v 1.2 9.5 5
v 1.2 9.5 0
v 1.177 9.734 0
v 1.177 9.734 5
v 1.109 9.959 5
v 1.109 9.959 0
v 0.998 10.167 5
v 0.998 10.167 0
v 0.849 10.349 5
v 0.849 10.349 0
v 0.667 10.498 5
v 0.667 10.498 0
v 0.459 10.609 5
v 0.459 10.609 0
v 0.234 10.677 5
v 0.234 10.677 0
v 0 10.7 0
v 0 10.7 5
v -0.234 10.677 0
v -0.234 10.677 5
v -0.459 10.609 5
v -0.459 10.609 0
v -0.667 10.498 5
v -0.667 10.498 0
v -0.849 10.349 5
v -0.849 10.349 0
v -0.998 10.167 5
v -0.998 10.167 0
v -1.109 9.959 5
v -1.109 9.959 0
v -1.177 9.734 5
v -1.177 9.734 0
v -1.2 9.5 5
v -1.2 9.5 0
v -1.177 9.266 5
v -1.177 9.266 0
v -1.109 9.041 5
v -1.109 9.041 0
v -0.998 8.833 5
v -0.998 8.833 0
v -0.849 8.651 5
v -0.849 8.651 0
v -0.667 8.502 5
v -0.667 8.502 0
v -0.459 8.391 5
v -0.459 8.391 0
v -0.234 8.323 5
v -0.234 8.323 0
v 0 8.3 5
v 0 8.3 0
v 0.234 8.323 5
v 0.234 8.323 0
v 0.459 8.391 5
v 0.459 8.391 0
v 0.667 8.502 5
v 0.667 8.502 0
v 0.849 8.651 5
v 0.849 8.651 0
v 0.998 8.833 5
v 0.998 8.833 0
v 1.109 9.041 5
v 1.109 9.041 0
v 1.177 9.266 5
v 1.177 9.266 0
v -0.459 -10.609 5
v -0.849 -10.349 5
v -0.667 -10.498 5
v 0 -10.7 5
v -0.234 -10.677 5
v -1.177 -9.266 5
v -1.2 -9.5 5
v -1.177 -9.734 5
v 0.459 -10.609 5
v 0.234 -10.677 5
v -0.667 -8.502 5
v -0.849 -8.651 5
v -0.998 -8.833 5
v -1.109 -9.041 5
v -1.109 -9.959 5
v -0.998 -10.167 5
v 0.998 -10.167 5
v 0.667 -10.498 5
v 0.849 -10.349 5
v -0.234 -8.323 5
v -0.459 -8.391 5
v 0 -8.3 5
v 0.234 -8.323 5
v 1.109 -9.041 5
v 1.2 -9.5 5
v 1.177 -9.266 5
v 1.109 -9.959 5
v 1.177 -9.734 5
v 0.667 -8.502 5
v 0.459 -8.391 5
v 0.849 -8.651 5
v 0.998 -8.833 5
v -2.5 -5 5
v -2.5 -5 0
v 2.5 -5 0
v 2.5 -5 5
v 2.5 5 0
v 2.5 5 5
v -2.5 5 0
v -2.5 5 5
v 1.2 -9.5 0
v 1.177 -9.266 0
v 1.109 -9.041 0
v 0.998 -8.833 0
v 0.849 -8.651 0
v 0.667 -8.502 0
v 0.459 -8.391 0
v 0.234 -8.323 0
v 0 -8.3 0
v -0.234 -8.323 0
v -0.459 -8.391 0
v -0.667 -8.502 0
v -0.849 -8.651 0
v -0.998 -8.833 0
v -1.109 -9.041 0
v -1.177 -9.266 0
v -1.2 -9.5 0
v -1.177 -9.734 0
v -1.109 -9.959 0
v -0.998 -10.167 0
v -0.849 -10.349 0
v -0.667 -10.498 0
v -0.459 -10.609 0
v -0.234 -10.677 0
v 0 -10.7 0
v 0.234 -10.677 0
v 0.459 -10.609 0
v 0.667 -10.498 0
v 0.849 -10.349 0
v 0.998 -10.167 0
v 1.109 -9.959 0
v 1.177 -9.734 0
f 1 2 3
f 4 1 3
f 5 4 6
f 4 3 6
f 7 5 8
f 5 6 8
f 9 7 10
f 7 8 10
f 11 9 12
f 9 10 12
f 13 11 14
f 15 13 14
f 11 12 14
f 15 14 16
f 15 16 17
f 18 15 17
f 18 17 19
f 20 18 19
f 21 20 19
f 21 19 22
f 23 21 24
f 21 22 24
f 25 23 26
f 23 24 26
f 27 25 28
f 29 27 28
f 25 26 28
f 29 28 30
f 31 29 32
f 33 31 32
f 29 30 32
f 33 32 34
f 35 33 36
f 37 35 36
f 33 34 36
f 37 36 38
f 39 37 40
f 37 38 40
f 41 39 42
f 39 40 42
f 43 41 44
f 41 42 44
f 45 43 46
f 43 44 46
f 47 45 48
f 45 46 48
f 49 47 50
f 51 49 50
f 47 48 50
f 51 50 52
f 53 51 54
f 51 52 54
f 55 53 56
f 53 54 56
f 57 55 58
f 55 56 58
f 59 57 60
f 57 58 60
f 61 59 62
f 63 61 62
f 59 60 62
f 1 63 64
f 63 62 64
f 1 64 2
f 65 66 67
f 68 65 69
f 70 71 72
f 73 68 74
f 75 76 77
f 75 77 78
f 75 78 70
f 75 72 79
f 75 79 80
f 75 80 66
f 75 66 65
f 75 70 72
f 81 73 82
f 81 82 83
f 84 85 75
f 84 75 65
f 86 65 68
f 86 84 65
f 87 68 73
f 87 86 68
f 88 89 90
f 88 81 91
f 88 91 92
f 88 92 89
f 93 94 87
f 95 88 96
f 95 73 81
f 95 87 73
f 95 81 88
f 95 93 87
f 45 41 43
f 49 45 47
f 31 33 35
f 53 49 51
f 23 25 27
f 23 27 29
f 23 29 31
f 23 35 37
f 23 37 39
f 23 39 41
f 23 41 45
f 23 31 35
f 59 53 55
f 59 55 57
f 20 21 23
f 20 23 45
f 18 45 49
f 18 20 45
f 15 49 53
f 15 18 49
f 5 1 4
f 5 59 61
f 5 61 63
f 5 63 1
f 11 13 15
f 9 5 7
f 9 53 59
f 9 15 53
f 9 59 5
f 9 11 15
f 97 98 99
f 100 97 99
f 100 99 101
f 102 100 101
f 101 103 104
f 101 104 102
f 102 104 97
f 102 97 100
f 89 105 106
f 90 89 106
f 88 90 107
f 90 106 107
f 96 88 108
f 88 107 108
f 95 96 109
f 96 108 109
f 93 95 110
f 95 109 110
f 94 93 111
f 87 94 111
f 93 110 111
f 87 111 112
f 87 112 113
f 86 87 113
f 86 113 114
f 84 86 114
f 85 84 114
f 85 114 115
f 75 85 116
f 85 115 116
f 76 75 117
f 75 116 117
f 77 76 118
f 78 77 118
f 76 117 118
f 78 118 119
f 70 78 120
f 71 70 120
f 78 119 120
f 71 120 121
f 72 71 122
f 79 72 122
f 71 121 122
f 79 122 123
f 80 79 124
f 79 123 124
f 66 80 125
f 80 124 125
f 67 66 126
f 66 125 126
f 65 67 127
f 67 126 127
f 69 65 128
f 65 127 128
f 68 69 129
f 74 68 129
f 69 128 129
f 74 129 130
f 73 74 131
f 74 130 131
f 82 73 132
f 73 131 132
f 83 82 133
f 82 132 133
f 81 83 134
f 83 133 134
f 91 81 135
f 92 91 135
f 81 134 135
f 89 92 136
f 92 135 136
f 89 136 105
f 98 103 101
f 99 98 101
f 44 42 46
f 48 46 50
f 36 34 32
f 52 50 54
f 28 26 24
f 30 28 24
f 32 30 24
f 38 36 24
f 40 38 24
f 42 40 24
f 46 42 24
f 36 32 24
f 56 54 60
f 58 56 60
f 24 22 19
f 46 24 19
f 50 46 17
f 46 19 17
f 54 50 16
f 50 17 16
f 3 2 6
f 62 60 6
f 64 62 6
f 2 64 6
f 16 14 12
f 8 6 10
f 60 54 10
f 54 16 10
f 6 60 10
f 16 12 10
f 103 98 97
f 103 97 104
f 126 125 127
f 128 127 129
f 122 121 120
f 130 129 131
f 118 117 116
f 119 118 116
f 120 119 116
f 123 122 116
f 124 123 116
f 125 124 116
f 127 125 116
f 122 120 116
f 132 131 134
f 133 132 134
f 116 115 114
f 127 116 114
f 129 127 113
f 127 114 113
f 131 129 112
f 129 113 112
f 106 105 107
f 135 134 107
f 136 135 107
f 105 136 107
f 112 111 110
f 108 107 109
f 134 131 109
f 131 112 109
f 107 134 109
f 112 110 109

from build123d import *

# Parameters (mm, degrees)
SKETCH002_W   = 7.5
SKETCH002_H   = 23.2
SKETCH002_R   = 1.2
SKETCH002_W_2 = 5
SKETCH002_H_2 = 10
PAD_DEPTH     = 5
BOX023_W      = 6
BOX023_H      = 23
BOX023_DEPTH  = 5


with BuildPart() as body:
    # Sketch002 → Pad (new body)
    with BuildSketch(Plane.XY):
        Rectangle(SKETCH002_W, SKETCH002_H)
        with Locations((0, 9.5)):
            Circle(SKETCH002_R, mode=Mode.SUBTRACT)
        with Locations((0, -9.5)):
            Circle(SKETCH002_R, mode=Mode.SUBTRACT)
        Rectangle(SKETCH002_W_2, SKETCH002_H_2, mode=Mode.SUBTRACT)
    extrude(amount=PAD_DEPTH)


with BuildPart() as switch_holes_cut:
    # Box023 → Box023 (new body)
    with BuildSketch(Plane(origin=(-3, -11.5, 0), x_dir=(1, 0, 0), z_dir=(0, 0, 1))):
        with Locations((3, 11.5)):
            Rectangle(BOX023_W, BOX023_H)
    extrude(amount=BOX023_DEPTH)

    # Cut: cut Body
    add(body.part, mode=Mode.SUBTRACT)


solid = switch_holes_cut.part
